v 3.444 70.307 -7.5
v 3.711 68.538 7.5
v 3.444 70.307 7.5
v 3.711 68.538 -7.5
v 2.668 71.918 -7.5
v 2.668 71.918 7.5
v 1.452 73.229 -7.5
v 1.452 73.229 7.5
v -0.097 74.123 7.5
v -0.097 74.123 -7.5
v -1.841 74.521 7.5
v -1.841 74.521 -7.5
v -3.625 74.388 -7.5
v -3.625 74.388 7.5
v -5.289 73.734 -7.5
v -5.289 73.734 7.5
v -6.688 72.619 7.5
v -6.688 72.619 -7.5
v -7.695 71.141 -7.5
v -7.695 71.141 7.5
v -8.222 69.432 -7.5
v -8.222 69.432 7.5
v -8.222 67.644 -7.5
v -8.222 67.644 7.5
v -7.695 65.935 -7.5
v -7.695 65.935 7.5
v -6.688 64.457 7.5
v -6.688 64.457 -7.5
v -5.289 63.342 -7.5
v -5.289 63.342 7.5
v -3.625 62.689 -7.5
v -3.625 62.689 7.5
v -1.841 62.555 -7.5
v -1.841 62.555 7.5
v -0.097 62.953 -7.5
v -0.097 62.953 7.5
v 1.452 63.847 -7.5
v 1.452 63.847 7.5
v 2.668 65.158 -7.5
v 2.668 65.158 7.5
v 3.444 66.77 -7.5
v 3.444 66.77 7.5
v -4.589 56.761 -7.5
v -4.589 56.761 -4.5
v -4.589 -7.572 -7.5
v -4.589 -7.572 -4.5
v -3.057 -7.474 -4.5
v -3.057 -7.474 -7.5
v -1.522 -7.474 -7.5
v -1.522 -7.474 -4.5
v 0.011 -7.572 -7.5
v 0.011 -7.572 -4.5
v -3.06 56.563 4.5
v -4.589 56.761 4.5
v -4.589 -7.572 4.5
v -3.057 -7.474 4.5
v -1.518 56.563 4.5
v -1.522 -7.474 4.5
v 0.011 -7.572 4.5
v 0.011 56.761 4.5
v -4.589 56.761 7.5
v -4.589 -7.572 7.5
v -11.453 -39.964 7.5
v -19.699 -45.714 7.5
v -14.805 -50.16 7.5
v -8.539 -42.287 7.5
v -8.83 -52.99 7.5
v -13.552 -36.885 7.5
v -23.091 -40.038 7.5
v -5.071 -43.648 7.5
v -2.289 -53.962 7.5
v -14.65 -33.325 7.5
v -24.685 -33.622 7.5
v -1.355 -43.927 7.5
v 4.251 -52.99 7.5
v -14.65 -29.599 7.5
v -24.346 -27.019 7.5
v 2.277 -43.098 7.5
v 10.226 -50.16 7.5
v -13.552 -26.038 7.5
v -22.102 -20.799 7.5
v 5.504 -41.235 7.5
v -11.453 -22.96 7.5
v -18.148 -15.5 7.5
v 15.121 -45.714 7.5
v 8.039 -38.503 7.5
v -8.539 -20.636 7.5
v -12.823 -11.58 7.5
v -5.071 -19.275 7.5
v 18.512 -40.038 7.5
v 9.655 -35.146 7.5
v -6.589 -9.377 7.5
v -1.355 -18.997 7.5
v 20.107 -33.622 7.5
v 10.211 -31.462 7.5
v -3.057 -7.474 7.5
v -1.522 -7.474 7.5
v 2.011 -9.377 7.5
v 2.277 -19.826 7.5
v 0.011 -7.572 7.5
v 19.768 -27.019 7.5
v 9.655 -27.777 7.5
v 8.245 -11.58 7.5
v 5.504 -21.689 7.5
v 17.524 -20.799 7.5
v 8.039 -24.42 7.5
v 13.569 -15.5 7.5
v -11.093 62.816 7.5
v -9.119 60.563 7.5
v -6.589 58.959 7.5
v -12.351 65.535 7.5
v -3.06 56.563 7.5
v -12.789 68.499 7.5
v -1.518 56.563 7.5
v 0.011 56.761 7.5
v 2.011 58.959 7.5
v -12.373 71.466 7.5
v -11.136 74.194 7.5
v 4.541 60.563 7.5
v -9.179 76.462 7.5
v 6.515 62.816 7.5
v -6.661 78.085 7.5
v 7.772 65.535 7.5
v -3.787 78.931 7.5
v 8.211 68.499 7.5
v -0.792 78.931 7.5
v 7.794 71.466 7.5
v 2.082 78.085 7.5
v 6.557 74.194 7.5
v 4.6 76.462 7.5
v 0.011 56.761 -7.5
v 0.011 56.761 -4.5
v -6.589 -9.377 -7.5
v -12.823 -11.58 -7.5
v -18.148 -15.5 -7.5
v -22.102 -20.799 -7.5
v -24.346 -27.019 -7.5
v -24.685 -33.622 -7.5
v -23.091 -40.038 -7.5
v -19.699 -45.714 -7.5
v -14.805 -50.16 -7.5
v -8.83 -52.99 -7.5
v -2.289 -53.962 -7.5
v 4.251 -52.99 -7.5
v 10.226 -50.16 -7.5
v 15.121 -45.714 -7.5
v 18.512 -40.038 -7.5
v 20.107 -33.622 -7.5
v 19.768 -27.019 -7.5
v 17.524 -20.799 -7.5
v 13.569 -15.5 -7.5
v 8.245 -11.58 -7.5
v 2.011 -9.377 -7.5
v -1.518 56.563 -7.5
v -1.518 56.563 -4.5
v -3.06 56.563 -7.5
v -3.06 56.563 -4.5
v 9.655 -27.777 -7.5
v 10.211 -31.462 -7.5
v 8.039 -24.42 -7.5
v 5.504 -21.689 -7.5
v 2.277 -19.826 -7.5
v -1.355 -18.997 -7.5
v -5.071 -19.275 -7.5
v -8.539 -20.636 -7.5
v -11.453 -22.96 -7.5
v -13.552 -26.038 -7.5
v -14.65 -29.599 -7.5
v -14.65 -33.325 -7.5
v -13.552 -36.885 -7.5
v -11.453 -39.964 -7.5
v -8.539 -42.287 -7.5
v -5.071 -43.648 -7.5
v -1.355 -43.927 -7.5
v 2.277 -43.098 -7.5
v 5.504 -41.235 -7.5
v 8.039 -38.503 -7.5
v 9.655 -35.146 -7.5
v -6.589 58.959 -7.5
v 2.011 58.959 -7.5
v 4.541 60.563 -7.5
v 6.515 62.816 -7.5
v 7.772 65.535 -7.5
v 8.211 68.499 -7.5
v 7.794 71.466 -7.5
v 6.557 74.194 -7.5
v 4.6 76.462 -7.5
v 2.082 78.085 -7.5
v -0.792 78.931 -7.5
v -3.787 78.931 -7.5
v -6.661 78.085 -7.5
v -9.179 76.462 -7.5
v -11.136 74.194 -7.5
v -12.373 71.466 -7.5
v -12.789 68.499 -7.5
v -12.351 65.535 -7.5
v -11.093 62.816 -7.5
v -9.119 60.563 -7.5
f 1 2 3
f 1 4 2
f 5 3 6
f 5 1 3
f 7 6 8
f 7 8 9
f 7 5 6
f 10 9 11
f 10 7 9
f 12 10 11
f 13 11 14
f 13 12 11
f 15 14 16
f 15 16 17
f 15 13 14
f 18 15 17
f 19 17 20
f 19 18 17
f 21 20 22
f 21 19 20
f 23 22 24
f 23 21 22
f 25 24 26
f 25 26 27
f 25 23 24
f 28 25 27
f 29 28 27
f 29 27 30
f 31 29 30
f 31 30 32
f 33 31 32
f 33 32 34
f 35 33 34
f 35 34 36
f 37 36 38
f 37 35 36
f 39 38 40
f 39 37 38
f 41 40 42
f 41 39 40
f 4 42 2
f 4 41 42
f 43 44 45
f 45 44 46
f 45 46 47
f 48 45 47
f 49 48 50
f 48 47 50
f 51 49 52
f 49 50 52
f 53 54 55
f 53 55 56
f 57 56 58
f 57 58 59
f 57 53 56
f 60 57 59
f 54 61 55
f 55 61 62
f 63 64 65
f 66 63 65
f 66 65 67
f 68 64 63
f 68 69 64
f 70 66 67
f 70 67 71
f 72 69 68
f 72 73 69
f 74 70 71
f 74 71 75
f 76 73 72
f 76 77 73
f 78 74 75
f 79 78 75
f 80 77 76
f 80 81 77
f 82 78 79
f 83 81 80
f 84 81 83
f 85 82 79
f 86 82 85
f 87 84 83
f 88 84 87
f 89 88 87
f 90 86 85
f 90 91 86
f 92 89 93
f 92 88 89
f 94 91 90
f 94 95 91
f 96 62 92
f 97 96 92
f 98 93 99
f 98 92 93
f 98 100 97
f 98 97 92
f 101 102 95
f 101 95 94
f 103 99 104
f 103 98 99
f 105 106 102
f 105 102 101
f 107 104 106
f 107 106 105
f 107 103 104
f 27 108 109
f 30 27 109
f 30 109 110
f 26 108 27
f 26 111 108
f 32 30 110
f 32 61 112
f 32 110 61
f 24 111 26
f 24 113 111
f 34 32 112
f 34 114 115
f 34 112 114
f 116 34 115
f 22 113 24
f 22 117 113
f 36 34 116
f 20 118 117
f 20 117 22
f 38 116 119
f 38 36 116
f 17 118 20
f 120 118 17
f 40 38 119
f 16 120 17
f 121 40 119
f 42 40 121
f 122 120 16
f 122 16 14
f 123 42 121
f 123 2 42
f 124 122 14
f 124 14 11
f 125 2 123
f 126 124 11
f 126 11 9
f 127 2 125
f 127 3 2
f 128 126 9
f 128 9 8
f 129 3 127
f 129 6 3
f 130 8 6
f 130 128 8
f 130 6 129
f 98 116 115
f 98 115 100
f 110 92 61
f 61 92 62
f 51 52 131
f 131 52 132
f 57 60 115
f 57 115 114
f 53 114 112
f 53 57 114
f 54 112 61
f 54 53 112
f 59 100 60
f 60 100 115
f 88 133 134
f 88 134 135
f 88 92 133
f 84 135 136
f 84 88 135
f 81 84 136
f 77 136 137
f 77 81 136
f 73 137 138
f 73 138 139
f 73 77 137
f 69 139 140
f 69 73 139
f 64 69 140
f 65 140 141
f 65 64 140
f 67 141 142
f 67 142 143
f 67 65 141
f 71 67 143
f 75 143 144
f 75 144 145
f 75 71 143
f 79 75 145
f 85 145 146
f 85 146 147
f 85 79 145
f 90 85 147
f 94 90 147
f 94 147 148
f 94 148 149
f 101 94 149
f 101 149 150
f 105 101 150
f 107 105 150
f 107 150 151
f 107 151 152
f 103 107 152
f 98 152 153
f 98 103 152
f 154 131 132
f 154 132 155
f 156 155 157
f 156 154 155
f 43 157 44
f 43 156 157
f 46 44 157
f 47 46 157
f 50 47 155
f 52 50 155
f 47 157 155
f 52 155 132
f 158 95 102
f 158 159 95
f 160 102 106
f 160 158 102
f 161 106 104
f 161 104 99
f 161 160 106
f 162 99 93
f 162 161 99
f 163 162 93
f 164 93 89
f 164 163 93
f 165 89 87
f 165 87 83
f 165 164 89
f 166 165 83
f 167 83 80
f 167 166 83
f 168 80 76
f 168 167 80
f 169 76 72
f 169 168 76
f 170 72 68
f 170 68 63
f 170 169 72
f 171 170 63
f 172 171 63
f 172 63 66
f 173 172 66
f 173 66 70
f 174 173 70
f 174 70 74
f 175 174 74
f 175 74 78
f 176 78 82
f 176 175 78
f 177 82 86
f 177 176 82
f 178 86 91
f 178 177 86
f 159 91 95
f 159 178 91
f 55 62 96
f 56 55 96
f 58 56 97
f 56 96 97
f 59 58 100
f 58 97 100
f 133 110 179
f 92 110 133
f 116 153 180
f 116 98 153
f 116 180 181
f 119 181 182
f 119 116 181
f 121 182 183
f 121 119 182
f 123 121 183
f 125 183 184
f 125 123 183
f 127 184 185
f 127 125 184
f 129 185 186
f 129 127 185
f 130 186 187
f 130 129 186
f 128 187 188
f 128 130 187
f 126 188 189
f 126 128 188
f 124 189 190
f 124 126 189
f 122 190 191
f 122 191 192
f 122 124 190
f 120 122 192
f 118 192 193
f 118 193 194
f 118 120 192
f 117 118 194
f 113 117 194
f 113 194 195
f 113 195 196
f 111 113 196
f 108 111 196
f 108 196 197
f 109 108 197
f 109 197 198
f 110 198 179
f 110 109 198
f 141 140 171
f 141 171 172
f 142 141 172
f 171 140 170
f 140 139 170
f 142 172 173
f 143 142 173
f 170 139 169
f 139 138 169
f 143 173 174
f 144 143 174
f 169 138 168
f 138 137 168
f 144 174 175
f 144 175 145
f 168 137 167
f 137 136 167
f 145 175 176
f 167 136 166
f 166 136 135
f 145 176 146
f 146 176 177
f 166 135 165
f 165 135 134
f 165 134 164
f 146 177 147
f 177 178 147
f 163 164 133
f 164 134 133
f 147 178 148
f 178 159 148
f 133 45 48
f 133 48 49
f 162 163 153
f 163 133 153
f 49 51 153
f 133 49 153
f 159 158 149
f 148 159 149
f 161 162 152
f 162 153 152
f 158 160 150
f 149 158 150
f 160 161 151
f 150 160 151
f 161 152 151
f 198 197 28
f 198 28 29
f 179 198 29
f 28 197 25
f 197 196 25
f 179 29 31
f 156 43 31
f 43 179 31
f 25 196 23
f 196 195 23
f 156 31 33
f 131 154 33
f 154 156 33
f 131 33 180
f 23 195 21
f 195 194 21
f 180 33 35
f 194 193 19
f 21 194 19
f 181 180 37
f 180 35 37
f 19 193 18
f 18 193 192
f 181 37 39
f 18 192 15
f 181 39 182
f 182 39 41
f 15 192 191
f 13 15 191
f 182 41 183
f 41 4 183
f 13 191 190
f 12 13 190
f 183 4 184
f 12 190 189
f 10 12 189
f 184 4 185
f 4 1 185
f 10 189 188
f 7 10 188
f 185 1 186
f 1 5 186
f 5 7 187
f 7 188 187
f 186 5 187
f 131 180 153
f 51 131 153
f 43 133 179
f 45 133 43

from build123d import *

# Parameters (mm, degrees)
SKETCH1_R           = 12.5
SKETCH1_R_2         = 6
BOSS_EXTRUDE2_DEPTH = 7.5
BOSS_EXTRUDE3_DEPTH = 4.5


with BuildPart() as part:
    # Sketch1 → Boss-Extrude2 (new body, symmetric)
    with BuildSketch(Plane.XY):
        with BuildLine():
            Line((2.01059306, -9.376516335), (2.01059306, 58.959050431))
            ThreePointArc((2.01059306, 58.959050431), (-2.28940694, 79.038194443), (-6.58940694, 58.959050431))
            Line((-6.58940694, 58.959050431), (-6.58940694, -9.376516335))
            ThreePointArc((-6.58940694, -9.376516335), (-2.28940694, -53.961805557), (2.01059306, -9.376516335))
        make_face()
        with Locations((-2.28940694, -31.461805557)):
            Circle(SKETCH1_R, mode=Mode.SUBTRACT)
        with Locations((-2.28940694, 68.538194443)):
            Circle(SKETCH1_R_2, mode=Mode.SUBTRACT)
        with BuildLine():
            Line((-4.58940694, 56.760673481), (-4.58940694, -7.572268098))
            ThreePointArc((-4.58940694, -7.572268098), (-2.28940694, -7.461805557), (0.01059306, -7.572268098))
            Line((0.01059306, -7.572268098), (0.01059306, 56.760673481))
            ThreePointArc((0.01059306, 56.760673481), (-2.28940694, 56.538194443), (-4.58940694, 56.760673481))
        make_face(mode=Mode.SUBTRACT)
    extrude(amount=BOSS_EXTRUDE2_DEPTH, both=True)

    # Sketch2 → Boss-Extrude3 (add, symmetric)
    with BuildSketch(Plane.XY):
        with BuildLine():
            Line((-4.58940694, 56.760673481), (-4.58940694, -7.572268098))
            ThreePointArc((-4.58940694, -7.572268098), (-2.28940694, -7.461805557), (0.01059306, -7.572268098))
            Line((0.01059306, -7.572268098), (0.01059306, 56.760673481))
            ThreePointArc((0.01059306, 56.760673481), (-2.28940694, 56.538194443), (-4.58940694, 56.760673481))
        make_face()
    extrude(amount=BOSS_EXTRUDE3_DEPTH, both=True)


solid = part.part
